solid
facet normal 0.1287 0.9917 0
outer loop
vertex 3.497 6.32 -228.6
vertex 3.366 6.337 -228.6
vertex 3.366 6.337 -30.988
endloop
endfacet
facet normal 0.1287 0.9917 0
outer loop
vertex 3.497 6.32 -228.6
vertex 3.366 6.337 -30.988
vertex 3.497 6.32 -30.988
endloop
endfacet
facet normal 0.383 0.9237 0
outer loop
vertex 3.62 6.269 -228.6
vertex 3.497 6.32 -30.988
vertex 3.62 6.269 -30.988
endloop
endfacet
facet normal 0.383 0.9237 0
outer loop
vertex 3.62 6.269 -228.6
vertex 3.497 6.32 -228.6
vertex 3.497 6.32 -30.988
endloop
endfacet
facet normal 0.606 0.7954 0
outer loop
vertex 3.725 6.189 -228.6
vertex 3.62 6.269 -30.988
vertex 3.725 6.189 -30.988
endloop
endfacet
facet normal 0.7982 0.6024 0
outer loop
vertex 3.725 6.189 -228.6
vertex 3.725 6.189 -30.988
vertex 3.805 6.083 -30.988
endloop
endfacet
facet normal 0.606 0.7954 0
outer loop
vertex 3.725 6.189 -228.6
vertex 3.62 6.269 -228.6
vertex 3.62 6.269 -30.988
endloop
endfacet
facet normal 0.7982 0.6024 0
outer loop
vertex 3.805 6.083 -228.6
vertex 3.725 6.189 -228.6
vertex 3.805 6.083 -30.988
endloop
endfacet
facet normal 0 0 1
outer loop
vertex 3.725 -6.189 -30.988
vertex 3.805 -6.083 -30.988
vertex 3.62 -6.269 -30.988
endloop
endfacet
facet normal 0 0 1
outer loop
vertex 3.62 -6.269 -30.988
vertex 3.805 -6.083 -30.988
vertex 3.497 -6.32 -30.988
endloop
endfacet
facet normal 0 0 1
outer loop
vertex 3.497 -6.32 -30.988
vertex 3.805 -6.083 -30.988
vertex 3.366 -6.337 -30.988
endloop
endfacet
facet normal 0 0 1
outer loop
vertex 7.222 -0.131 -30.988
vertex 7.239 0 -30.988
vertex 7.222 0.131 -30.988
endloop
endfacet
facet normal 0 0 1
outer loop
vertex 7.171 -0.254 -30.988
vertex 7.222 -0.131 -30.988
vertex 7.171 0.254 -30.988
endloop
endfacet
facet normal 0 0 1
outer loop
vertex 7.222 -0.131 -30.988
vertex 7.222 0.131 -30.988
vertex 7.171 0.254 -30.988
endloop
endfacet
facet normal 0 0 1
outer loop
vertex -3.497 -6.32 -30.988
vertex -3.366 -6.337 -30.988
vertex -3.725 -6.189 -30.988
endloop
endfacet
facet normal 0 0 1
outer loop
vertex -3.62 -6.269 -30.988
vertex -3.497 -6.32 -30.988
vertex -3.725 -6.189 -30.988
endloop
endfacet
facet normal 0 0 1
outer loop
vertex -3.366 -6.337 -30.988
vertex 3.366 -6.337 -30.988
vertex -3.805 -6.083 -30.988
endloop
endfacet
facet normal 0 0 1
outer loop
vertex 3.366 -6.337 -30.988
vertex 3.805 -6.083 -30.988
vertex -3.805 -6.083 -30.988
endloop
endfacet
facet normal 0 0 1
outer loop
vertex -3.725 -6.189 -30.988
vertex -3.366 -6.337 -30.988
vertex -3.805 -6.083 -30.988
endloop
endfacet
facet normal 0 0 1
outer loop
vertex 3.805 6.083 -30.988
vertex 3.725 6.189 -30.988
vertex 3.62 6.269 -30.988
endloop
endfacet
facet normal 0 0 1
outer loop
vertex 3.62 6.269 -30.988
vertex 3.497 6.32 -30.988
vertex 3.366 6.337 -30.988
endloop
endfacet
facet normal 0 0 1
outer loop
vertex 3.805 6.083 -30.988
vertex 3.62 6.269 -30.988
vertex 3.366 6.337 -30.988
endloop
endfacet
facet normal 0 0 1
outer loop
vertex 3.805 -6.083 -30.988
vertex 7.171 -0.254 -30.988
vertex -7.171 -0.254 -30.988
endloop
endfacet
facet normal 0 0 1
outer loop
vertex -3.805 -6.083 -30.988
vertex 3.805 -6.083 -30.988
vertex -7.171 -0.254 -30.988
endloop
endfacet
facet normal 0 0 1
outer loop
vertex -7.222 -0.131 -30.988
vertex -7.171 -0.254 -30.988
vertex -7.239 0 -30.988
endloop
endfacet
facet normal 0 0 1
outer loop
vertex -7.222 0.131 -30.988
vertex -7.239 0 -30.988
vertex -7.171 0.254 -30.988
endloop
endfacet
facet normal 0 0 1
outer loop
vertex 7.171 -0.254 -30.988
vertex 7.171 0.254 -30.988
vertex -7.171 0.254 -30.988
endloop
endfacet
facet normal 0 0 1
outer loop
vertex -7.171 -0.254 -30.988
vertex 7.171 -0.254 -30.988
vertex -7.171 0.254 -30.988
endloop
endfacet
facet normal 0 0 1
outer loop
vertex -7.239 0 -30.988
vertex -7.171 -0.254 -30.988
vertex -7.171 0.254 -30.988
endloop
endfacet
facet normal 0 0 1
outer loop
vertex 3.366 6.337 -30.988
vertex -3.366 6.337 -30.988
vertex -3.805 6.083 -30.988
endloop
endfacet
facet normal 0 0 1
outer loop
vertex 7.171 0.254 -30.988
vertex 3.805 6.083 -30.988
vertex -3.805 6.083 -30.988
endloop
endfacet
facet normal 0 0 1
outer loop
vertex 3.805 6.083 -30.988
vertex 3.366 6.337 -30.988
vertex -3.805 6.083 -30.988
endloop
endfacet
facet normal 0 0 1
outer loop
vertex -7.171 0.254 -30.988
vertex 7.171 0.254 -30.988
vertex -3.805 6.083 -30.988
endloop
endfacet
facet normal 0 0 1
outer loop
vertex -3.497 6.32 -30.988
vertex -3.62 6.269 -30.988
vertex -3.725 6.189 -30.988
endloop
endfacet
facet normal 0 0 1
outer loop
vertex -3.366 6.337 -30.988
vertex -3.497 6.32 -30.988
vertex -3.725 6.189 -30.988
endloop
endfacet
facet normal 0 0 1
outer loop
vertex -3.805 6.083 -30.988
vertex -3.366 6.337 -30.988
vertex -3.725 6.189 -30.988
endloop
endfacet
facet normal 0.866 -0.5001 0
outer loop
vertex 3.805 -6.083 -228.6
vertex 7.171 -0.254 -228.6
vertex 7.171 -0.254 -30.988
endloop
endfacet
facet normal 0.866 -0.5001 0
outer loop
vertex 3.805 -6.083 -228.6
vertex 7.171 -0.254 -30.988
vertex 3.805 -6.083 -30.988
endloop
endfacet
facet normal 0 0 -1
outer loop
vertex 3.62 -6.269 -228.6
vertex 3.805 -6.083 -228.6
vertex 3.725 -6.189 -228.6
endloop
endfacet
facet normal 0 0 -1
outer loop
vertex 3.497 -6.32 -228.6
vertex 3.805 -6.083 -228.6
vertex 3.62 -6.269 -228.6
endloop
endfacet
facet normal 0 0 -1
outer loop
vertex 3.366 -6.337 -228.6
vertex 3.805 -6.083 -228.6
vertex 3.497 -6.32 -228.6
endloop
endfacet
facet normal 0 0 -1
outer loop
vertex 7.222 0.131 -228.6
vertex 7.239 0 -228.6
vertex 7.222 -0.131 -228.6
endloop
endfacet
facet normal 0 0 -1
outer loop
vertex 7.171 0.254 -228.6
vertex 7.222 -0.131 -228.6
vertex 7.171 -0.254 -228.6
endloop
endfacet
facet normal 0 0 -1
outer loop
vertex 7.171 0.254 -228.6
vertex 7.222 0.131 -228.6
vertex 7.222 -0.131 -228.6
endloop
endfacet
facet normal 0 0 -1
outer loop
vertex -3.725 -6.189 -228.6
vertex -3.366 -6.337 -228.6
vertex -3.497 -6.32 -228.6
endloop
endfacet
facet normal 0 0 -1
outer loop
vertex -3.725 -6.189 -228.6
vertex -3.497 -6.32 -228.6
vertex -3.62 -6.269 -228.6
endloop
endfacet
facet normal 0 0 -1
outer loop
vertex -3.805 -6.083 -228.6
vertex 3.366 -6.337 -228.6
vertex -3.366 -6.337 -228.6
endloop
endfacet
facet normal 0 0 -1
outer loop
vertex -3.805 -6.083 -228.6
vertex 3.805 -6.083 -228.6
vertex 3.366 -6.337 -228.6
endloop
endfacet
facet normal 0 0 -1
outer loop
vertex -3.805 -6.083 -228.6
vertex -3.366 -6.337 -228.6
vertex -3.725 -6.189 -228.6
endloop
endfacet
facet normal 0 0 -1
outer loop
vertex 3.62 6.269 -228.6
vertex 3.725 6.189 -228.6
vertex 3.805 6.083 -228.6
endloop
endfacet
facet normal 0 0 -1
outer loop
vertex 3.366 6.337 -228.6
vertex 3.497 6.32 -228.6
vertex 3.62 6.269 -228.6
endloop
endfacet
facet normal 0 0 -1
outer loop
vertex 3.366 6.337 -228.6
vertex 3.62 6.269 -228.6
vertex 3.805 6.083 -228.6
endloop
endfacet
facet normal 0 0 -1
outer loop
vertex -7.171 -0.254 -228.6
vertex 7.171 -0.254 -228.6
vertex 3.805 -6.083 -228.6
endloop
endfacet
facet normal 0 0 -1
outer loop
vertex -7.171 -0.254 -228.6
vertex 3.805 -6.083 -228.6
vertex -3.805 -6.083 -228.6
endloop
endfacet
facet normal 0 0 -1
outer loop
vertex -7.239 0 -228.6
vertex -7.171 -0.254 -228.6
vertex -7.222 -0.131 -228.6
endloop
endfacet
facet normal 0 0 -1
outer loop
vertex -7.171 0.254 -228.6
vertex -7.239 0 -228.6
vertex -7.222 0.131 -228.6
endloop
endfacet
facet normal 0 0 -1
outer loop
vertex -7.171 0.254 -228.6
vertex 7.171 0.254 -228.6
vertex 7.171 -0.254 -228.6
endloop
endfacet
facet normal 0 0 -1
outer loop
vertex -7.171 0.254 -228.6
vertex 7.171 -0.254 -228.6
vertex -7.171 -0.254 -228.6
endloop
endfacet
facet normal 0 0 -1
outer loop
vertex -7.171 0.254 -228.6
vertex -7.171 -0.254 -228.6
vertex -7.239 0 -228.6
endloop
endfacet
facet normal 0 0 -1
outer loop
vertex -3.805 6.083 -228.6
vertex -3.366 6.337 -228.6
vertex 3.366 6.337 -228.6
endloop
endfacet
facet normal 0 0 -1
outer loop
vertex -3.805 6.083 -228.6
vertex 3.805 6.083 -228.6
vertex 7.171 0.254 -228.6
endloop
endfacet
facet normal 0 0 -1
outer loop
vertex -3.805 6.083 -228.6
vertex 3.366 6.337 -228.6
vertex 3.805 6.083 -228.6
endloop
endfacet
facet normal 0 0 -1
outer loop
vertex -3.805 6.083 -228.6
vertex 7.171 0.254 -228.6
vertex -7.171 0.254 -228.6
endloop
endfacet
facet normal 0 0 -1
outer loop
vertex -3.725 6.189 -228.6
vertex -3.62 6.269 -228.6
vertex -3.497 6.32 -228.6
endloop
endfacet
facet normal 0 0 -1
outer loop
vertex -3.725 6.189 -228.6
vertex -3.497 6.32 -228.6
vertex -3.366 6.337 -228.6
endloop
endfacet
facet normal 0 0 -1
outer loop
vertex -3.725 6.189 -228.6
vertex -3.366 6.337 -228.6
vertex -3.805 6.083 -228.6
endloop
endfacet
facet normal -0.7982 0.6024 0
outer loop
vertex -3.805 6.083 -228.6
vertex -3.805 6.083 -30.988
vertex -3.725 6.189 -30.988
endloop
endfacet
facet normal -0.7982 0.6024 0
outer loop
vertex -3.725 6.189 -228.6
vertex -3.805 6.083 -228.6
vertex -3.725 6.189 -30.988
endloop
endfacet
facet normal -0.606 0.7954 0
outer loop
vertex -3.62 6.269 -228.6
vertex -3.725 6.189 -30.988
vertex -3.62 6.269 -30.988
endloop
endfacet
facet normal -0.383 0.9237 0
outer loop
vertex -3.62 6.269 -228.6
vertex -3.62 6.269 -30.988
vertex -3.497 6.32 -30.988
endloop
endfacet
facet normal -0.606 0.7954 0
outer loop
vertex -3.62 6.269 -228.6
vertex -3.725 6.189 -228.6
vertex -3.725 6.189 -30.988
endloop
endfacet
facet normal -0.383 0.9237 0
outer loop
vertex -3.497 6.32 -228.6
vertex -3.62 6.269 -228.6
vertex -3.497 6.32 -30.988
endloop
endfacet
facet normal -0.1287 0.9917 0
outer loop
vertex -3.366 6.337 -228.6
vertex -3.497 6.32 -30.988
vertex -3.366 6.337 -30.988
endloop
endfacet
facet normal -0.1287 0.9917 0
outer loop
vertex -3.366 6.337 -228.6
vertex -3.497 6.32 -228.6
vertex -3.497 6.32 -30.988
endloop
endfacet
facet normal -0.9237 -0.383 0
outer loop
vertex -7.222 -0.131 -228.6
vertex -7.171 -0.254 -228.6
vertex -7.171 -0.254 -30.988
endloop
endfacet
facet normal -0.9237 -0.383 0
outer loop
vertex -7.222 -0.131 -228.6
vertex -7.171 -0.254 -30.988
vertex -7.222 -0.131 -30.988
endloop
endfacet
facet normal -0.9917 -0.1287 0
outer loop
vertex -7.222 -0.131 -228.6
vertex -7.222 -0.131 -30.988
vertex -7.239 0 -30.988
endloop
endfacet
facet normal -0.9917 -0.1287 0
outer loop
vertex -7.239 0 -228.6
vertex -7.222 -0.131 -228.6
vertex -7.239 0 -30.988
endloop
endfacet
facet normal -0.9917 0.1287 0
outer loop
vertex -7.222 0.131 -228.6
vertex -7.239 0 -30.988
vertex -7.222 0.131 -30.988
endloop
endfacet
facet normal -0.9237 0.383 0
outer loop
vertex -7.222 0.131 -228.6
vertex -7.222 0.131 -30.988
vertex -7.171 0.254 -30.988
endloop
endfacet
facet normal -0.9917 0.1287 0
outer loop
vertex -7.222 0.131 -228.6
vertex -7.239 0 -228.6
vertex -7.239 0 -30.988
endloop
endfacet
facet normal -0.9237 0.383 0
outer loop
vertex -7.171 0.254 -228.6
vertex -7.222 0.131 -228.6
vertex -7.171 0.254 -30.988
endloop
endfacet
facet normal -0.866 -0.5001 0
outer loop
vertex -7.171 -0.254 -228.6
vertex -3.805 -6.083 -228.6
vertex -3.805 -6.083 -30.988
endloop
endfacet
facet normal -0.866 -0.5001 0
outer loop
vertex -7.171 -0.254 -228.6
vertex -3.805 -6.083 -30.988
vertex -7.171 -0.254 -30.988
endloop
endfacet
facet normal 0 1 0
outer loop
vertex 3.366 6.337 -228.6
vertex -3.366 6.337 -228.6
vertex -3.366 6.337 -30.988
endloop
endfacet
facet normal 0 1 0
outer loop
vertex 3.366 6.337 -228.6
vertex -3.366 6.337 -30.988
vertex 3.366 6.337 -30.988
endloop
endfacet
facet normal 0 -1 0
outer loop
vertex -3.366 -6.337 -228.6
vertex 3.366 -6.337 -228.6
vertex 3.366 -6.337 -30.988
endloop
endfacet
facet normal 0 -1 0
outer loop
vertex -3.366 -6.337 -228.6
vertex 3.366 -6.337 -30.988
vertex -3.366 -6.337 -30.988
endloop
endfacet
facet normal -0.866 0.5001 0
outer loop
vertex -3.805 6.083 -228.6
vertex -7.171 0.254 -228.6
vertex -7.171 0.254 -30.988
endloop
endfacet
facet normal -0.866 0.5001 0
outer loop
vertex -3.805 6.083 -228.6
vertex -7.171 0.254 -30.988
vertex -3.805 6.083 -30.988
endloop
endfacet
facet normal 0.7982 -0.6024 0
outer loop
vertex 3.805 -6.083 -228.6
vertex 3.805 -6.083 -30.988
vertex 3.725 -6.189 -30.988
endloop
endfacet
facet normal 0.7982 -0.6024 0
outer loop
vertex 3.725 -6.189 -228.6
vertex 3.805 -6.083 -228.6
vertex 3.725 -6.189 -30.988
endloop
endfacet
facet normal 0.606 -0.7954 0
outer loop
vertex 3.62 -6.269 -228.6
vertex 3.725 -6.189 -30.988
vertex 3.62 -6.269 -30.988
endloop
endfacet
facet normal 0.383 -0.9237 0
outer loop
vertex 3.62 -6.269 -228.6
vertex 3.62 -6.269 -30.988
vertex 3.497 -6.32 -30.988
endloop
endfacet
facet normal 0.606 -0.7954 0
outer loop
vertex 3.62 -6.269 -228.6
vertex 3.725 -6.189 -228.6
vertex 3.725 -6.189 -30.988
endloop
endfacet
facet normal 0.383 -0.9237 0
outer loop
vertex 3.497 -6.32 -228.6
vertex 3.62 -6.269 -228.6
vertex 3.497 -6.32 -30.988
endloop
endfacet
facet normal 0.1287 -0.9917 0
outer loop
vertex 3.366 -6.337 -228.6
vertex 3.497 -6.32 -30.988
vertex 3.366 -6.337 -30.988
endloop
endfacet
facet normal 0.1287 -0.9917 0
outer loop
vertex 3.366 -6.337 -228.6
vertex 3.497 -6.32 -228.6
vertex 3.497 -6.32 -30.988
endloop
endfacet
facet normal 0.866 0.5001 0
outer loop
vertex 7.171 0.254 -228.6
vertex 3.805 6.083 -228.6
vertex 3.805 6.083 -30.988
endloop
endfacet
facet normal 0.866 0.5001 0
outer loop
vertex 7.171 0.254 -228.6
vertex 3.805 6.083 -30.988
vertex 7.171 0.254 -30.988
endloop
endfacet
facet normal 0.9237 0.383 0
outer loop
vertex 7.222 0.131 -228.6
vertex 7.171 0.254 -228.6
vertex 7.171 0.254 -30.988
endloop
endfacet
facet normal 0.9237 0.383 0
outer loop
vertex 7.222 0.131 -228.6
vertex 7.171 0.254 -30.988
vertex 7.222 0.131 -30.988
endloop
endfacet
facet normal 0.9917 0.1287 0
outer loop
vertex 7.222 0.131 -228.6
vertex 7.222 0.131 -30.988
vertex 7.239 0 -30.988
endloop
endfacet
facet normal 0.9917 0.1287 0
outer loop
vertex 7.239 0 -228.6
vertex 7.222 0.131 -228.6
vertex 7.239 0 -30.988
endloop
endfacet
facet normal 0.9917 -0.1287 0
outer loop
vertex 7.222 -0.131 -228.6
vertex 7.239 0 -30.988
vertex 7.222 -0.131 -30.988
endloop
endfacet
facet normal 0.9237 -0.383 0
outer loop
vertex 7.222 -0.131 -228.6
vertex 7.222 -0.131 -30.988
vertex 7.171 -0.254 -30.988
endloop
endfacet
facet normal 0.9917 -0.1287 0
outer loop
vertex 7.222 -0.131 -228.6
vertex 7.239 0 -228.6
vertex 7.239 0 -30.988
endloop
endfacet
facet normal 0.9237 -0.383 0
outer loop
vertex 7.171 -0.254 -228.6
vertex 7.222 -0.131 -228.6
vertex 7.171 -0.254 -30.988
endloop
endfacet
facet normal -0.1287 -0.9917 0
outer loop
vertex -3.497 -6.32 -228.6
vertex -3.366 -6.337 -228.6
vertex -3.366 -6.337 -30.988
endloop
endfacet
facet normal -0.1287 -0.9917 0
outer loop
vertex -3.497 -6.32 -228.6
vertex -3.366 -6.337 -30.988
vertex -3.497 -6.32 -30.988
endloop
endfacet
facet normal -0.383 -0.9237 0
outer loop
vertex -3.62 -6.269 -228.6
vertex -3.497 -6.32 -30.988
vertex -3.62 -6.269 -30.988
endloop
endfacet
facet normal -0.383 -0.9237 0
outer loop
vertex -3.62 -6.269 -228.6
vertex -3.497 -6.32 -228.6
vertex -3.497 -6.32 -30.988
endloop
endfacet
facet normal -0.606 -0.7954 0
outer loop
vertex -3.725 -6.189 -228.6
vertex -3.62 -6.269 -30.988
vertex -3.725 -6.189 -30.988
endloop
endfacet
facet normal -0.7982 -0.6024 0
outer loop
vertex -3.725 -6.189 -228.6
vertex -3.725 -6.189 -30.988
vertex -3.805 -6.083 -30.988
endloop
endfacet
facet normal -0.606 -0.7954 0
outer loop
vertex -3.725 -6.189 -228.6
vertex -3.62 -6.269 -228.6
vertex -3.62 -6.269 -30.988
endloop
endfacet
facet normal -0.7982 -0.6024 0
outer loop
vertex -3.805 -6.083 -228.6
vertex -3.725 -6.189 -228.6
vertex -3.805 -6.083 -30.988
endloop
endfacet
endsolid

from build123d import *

# Parameters (mm, degrees)
BOSS_EXTRUDE1_DEPTH = 197.612


with BuildPart() as part:
    # Sketch1 → Boss-Extrude1 (new body)
    with BuildSketch(Plane(origin=(0, 0, -228.6), x_dir=(-1, 0, 0), z_dir=(0, 0, -1))):
        with BuildLine():
            Line((3.805488829, -6.0833), (7.171036753, -0.254))
            ThreePointArc((7.171036753, -0.254), (7.239095848, 0), (7.171036753, 0.254))
            Line((7.171036753, 0.254), (3.805488829, 6.0833))
            ThreePointArc((3.805488829, 6.0833), (3.619547924, 6.269240905), (3.365547924, 6.3373))
            Line((3.365547924, 6.3373), (-3.365547924, 6.3373))
            ThreePointArc((-3.365547924, 6.3373), (-3.619547924, 6.269240905), (-3.805488829, 6.0833))
            Line((-3.805488829, 6.0833), (-7.171036753, 0.254))
            ThreePointArc((-7.171036753, 0.254), (-7.239095848, 0), (-7.171036753, -0.254))
            Line((-7.171036753, -0.254), (-3.805488829, -6.0833))
            ThreePointArc((-3.805488829, -6.0833), (-3.619547924, -6.269240905), (-3.365547924, -6.3373))
            Line((-3.365547924, -6.3373), (3.365547924, -6.3373))
            ThreePointArc((3.365547924, -6.3373), (3.619547924, -6.269240905), (3.805488829, -6.0833))
        make_face()
    extrude(amount=-BOSS_EXTRUDE1_DEPTH)


solid = part.part
